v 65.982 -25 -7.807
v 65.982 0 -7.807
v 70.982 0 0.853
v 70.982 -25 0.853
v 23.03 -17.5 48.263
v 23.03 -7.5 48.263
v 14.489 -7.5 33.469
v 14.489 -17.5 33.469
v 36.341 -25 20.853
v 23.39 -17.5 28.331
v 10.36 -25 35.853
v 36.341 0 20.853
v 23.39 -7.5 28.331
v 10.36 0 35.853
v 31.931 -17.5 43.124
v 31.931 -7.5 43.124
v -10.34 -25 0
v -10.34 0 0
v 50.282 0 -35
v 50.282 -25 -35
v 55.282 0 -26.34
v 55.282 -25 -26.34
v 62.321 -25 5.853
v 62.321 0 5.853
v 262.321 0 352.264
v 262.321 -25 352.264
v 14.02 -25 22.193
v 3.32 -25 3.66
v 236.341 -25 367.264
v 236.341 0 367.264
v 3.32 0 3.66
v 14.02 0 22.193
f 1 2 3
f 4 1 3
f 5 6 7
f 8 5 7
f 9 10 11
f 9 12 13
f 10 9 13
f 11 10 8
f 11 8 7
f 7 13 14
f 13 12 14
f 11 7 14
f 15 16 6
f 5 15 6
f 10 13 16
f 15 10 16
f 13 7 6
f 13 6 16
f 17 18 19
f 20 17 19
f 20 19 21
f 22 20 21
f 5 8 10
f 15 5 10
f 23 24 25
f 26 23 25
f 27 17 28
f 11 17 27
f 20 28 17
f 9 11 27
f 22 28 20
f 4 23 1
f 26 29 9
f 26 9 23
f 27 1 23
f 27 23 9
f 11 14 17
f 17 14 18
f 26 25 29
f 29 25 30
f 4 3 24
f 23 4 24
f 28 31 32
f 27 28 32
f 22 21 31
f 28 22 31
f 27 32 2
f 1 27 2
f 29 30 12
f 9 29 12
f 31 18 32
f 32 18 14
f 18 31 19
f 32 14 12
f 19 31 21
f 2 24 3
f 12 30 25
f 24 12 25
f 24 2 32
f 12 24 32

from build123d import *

# Parameters (mm, degrees)
F1_DEPTH = 25
F2_ANGLE = 30
F4_DEPTH = 25
F6_START = 7.5
F6_DEPTH = 10


with BuildPart() as f1:
    # F0 (on Front) → F1 (new body)
    with BuildSketch(Plane.XZ):
        Polygon((59.6599376417, 0), (59.6599376417, 10), (-0.3400623583, 10), (-0.3400623583, 31.4), (59.6599376417, 31.4), (59.6599376417, 41.4), (-10.3400623583, 41.4), (-10.3400623583, 0), align=None)
    extrude(amount=F1_DEPTH)


with BuildPart() as f1_1:
    # F2: moved
    add(f1.part.rotate(Axis((-10.3400623583, -12.5, 0), (0, 1, 0)), F2_ANGLE))

    # F3 (on Front) → F4 (join)
    with BuildSketch(Plane.XZ):
        Polygon((36.3406997552, 20.8534517167), (62.3214618687, 5.8534517167), (262.3214618687, 352.2636132305), (236.3406997552, 367.2636132305), align=None)
    extrude(amount=F4_DEPTH)

    # F5 (on Front) → F6 (join)
    with BuildSketch(Plane.XZ.offset(F6_START)):
        Polygon((23.3896902468, 28.3307205427), (31.9308649473, 43.1244690803), (23.0304820152, 48.263107562), (14.4893073146, 33.4693590244), align=None)
    extrude(amount=F6_DEPTH)


solid = f1_1.part
